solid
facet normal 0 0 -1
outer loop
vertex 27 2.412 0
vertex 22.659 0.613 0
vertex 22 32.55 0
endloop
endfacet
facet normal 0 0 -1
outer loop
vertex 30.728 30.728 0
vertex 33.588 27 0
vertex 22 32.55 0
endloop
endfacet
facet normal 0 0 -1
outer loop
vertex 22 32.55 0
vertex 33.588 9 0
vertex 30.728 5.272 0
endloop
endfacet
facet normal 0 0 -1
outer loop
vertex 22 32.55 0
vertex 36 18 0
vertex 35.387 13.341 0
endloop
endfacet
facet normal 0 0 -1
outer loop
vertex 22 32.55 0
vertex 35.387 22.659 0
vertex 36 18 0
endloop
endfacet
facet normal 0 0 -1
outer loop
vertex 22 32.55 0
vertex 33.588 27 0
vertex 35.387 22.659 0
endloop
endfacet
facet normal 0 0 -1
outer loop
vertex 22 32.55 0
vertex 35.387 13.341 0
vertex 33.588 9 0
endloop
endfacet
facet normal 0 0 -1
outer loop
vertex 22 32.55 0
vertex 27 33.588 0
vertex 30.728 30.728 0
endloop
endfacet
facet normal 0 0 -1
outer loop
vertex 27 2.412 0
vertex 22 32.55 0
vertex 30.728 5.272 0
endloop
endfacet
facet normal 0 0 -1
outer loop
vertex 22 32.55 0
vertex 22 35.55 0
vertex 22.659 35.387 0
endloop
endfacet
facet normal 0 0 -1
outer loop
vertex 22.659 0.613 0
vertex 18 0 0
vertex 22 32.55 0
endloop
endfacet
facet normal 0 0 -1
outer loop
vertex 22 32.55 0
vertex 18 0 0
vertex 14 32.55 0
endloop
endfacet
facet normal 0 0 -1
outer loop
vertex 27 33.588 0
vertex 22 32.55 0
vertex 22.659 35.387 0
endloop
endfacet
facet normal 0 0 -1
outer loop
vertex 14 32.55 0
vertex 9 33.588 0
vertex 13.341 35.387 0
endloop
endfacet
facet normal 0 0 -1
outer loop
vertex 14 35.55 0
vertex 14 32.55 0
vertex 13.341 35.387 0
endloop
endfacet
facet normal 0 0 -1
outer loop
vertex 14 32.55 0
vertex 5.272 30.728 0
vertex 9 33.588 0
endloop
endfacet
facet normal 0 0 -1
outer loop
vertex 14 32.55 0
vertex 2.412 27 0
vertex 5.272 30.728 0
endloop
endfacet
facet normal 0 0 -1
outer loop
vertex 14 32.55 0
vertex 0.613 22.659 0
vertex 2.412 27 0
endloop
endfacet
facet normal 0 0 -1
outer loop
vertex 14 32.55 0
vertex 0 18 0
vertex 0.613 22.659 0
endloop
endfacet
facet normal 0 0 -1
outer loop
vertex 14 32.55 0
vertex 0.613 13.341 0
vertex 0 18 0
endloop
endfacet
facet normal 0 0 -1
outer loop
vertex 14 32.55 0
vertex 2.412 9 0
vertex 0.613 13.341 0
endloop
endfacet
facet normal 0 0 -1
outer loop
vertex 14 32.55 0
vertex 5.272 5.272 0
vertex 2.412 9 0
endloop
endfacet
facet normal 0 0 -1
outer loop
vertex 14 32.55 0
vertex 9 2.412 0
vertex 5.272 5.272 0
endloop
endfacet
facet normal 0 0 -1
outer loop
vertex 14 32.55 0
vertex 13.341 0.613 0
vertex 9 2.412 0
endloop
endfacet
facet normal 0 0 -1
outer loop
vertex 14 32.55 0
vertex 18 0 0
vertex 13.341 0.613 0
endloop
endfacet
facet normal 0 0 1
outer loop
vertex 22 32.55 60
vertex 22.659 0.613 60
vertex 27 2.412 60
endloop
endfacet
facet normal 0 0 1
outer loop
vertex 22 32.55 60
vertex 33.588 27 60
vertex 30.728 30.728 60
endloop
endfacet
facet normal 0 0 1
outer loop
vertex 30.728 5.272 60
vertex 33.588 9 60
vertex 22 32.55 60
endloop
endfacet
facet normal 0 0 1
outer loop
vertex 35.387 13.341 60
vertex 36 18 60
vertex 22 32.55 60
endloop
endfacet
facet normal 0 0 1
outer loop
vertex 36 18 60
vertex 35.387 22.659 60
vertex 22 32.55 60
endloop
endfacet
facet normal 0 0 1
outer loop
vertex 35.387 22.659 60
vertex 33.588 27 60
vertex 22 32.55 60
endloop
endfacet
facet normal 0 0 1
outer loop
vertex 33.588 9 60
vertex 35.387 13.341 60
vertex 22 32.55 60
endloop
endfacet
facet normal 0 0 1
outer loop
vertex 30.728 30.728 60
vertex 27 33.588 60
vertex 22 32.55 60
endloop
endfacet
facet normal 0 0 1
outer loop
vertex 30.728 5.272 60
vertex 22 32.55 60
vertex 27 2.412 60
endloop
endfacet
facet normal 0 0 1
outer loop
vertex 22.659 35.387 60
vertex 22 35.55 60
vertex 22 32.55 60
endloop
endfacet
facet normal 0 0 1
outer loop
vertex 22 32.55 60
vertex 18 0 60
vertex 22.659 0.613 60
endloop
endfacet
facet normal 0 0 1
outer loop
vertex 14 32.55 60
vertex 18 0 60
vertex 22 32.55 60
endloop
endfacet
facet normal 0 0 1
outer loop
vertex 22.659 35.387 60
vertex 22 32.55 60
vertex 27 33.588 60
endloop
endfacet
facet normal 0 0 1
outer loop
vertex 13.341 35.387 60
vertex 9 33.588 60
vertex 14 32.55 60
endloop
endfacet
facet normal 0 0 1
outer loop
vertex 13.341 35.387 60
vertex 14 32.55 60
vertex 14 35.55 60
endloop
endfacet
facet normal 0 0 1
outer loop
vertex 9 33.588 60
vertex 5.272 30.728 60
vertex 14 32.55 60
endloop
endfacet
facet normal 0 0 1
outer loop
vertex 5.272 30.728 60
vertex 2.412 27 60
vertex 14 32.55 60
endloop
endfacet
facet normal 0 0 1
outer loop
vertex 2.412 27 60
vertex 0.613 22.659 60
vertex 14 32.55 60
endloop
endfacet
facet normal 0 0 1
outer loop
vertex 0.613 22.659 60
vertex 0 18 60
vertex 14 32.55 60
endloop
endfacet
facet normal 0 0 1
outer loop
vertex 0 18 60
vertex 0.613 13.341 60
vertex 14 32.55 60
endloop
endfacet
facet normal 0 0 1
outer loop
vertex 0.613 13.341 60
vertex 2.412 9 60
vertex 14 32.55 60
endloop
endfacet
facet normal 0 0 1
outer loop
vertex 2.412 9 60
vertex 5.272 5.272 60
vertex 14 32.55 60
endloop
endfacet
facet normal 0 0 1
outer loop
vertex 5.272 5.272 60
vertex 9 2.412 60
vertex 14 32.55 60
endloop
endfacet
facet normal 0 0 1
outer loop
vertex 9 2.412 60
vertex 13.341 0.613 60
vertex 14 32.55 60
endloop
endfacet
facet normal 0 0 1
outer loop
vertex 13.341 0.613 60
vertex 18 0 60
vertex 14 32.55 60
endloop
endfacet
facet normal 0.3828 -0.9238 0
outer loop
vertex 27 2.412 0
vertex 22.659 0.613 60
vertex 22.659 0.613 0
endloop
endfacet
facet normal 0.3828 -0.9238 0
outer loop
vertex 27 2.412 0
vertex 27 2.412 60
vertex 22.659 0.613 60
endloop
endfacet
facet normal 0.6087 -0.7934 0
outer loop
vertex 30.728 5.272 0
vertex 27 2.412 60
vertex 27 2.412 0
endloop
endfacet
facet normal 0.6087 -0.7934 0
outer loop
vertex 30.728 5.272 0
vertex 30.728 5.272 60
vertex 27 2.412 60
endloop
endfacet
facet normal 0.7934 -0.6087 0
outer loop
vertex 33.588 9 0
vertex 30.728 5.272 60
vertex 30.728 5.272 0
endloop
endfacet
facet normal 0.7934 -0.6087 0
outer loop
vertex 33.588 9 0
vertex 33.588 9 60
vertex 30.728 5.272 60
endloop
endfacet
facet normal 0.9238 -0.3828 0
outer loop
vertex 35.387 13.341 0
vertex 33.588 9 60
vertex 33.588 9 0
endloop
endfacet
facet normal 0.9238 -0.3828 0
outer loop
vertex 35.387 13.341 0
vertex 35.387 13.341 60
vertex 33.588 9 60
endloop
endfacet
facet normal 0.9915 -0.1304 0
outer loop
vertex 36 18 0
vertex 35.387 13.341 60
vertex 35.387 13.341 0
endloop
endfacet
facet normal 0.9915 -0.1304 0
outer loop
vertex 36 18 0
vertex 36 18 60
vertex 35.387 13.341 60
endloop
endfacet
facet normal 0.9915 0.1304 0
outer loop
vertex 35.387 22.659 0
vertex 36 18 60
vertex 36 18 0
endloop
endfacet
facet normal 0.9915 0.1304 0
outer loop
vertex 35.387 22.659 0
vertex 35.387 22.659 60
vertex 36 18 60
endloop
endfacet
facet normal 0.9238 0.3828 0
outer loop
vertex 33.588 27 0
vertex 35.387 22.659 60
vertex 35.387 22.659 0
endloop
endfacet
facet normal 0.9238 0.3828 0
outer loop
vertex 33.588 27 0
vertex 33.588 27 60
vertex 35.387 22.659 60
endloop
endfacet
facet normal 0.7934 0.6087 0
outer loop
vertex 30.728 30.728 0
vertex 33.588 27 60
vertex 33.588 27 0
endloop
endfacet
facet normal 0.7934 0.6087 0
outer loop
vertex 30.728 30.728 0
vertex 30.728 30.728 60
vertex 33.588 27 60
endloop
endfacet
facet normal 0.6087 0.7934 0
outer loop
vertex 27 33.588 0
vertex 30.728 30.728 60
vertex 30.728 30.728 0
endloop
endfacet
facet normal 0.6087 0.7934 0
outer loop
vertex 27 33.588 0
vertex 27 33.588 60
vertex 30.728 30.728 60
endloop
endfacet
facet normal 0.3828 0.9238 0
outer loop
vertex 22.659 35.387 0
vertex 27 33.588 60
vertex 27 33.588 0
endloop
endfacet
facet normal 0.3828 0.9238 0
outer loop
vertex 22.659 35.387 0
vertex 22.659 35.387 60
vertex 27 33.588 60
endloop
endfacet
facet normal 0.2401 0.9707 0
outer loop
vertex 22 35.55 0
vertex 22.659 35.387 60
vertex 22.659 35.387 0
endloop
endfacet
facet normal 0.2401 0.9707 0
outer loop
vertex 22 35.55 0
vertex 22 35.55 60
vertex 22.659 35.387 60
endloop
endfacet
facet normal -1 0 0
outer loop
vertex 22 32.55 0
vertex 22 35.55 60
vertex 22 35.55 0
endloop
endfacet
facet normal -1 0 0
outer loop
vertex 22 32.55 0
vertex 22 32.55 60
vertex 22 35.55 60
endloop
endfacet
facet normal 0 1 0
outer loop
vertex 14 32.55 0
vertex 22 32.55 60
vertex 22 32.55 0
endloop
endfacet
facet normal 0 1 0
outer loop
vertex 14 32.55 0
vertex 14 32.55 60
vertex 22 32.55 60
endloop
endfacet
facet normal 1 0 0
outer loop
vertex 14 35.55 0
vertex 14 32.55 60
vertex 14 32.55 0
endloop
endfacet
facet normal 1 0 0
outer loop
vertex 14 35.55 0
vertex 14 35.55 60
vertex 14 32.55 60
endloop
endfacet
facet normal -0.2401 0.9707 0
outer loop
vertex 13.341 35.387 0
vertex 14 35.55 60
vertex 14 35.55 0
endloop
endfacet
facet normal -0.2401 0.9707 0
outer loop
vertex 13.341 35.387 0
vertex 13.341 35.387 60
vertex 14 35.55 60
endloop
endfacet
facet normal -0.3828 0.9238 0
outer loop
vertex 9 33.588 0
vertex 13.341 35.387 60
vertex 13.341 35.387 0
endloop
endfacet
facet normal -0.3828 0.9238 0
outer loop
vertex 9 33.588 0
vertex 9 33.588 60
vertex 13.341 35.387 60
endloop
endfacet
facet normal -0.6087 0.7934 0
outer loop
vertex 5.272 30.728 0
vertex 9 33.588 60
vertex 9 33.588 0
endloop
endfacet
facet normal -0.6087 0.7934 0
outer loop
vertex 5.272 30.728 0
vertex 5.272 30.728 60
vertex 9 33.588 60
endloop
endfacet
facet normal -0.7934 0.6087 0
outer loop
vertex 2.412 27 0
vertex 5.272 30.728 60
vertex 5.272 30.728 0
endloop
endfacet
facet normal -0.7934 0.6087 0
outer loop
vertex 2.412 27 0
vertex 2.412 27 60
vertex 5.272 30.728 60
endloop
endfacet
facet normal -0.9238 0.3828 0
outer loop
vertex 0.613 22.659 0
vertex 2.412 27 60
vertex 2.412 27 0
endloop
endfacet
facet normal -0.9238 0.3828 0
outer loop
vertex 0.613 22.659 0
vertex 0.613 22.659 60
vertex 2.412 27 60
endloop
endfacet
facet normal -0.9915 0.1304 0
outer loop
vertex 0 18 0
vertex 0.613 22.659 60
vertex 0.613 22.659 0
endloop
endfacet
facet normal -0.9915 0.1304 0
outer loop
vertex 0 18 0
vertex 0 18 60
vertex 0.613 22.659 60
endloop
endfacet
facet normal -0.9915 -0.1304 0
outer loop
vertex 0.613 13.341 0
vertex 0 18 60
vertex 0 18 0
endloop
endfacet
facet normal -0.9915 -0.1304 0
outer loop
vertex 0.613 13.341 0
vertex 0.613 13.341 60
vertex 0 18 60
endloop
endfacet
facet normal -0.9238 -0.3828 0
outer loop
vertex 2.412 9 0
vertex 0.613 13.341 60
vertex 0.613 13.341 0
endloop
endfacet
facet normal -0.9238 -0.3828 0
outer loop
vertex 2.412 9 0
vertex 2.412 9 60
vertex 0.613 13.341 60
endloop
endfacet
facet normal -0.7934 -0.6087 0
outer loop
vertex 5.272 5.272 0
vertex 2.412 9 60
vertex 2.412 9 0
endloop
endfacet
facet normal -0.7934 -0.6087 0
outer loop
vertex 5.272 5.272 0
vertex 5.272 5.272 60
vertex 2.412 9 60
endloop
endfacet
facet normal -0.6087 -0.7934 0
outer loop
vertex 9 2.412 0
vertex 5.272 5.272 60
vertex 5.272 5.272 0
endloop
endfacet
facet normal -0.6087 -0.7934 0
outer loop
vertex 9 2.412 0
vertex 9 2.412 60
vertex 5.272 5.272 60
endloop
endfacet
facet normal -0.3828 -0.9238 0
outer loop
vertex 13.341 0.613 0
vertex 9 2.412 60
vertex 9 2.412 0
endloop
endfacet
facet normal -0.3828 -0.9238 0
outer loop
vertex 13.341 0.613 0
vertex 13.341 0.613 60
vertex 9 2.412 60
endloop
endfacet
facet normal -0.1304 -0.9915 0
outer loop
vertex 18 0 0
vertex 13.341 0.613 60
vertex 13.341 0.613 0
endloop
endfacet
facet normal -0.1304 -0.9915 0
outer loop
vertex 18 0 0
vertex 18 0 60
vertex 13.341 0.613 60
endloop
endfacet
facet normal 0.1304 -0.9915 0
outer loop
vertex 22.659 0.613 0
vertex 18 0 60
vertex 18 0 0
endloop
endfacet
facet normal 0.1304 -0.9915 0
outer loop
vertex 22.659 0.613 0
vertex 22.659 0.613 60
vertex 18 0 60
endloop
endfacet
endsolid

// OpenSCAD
$fn = 32;

// ----------------------------------------------------------------------
// Keyway shaft: d36 shaft, key 8 x 3 mm
// ----------------------------------------------------------------------

// --- parameters (mm) ---
shaft_r = 18;             // shaft radius
key_w = 8;                // keyway width
key_d = 3;                // keyway depth below the surface line
plate_t = 60;             // shaft length, Z (extrusion height)
fit_tol = 0.1;            // declared fit tolerance (prompt contract)
free_tol = 0.3;           // declared free tolerance (prompt contract)

shaft_d = 2 * shaft_r;  // shaft diameter
circle_step = 15;  // polygon sampling step, degrees

profile = [[13.341, 35.387], [9, 33.588], [5.272, 30.728], [2.412, 27], [0.613, 22.659], [0, 18], [0.613, 13.341], [2.412, 9], [5.272, 5.272], [9, 2.412], [13.341, 0.613], [18, 0], [22.659, 0.613], [27, 2.412], [30.728, 5.272], [33.588, 9], [35.387, 13.341], [36, 18], [35.387, 22.659], [33.588, 27], [30.728, 30.728], [27, 33.588], [22.659, 35.387], [22, 35.55], [22, 32.55], [14, 32.55], [14, 35.55]];  // primary outline, 27 points, counter clockwise

// --- the one profile operation ---
linear_extrude(height = plate_t) polygon(points = profile);
